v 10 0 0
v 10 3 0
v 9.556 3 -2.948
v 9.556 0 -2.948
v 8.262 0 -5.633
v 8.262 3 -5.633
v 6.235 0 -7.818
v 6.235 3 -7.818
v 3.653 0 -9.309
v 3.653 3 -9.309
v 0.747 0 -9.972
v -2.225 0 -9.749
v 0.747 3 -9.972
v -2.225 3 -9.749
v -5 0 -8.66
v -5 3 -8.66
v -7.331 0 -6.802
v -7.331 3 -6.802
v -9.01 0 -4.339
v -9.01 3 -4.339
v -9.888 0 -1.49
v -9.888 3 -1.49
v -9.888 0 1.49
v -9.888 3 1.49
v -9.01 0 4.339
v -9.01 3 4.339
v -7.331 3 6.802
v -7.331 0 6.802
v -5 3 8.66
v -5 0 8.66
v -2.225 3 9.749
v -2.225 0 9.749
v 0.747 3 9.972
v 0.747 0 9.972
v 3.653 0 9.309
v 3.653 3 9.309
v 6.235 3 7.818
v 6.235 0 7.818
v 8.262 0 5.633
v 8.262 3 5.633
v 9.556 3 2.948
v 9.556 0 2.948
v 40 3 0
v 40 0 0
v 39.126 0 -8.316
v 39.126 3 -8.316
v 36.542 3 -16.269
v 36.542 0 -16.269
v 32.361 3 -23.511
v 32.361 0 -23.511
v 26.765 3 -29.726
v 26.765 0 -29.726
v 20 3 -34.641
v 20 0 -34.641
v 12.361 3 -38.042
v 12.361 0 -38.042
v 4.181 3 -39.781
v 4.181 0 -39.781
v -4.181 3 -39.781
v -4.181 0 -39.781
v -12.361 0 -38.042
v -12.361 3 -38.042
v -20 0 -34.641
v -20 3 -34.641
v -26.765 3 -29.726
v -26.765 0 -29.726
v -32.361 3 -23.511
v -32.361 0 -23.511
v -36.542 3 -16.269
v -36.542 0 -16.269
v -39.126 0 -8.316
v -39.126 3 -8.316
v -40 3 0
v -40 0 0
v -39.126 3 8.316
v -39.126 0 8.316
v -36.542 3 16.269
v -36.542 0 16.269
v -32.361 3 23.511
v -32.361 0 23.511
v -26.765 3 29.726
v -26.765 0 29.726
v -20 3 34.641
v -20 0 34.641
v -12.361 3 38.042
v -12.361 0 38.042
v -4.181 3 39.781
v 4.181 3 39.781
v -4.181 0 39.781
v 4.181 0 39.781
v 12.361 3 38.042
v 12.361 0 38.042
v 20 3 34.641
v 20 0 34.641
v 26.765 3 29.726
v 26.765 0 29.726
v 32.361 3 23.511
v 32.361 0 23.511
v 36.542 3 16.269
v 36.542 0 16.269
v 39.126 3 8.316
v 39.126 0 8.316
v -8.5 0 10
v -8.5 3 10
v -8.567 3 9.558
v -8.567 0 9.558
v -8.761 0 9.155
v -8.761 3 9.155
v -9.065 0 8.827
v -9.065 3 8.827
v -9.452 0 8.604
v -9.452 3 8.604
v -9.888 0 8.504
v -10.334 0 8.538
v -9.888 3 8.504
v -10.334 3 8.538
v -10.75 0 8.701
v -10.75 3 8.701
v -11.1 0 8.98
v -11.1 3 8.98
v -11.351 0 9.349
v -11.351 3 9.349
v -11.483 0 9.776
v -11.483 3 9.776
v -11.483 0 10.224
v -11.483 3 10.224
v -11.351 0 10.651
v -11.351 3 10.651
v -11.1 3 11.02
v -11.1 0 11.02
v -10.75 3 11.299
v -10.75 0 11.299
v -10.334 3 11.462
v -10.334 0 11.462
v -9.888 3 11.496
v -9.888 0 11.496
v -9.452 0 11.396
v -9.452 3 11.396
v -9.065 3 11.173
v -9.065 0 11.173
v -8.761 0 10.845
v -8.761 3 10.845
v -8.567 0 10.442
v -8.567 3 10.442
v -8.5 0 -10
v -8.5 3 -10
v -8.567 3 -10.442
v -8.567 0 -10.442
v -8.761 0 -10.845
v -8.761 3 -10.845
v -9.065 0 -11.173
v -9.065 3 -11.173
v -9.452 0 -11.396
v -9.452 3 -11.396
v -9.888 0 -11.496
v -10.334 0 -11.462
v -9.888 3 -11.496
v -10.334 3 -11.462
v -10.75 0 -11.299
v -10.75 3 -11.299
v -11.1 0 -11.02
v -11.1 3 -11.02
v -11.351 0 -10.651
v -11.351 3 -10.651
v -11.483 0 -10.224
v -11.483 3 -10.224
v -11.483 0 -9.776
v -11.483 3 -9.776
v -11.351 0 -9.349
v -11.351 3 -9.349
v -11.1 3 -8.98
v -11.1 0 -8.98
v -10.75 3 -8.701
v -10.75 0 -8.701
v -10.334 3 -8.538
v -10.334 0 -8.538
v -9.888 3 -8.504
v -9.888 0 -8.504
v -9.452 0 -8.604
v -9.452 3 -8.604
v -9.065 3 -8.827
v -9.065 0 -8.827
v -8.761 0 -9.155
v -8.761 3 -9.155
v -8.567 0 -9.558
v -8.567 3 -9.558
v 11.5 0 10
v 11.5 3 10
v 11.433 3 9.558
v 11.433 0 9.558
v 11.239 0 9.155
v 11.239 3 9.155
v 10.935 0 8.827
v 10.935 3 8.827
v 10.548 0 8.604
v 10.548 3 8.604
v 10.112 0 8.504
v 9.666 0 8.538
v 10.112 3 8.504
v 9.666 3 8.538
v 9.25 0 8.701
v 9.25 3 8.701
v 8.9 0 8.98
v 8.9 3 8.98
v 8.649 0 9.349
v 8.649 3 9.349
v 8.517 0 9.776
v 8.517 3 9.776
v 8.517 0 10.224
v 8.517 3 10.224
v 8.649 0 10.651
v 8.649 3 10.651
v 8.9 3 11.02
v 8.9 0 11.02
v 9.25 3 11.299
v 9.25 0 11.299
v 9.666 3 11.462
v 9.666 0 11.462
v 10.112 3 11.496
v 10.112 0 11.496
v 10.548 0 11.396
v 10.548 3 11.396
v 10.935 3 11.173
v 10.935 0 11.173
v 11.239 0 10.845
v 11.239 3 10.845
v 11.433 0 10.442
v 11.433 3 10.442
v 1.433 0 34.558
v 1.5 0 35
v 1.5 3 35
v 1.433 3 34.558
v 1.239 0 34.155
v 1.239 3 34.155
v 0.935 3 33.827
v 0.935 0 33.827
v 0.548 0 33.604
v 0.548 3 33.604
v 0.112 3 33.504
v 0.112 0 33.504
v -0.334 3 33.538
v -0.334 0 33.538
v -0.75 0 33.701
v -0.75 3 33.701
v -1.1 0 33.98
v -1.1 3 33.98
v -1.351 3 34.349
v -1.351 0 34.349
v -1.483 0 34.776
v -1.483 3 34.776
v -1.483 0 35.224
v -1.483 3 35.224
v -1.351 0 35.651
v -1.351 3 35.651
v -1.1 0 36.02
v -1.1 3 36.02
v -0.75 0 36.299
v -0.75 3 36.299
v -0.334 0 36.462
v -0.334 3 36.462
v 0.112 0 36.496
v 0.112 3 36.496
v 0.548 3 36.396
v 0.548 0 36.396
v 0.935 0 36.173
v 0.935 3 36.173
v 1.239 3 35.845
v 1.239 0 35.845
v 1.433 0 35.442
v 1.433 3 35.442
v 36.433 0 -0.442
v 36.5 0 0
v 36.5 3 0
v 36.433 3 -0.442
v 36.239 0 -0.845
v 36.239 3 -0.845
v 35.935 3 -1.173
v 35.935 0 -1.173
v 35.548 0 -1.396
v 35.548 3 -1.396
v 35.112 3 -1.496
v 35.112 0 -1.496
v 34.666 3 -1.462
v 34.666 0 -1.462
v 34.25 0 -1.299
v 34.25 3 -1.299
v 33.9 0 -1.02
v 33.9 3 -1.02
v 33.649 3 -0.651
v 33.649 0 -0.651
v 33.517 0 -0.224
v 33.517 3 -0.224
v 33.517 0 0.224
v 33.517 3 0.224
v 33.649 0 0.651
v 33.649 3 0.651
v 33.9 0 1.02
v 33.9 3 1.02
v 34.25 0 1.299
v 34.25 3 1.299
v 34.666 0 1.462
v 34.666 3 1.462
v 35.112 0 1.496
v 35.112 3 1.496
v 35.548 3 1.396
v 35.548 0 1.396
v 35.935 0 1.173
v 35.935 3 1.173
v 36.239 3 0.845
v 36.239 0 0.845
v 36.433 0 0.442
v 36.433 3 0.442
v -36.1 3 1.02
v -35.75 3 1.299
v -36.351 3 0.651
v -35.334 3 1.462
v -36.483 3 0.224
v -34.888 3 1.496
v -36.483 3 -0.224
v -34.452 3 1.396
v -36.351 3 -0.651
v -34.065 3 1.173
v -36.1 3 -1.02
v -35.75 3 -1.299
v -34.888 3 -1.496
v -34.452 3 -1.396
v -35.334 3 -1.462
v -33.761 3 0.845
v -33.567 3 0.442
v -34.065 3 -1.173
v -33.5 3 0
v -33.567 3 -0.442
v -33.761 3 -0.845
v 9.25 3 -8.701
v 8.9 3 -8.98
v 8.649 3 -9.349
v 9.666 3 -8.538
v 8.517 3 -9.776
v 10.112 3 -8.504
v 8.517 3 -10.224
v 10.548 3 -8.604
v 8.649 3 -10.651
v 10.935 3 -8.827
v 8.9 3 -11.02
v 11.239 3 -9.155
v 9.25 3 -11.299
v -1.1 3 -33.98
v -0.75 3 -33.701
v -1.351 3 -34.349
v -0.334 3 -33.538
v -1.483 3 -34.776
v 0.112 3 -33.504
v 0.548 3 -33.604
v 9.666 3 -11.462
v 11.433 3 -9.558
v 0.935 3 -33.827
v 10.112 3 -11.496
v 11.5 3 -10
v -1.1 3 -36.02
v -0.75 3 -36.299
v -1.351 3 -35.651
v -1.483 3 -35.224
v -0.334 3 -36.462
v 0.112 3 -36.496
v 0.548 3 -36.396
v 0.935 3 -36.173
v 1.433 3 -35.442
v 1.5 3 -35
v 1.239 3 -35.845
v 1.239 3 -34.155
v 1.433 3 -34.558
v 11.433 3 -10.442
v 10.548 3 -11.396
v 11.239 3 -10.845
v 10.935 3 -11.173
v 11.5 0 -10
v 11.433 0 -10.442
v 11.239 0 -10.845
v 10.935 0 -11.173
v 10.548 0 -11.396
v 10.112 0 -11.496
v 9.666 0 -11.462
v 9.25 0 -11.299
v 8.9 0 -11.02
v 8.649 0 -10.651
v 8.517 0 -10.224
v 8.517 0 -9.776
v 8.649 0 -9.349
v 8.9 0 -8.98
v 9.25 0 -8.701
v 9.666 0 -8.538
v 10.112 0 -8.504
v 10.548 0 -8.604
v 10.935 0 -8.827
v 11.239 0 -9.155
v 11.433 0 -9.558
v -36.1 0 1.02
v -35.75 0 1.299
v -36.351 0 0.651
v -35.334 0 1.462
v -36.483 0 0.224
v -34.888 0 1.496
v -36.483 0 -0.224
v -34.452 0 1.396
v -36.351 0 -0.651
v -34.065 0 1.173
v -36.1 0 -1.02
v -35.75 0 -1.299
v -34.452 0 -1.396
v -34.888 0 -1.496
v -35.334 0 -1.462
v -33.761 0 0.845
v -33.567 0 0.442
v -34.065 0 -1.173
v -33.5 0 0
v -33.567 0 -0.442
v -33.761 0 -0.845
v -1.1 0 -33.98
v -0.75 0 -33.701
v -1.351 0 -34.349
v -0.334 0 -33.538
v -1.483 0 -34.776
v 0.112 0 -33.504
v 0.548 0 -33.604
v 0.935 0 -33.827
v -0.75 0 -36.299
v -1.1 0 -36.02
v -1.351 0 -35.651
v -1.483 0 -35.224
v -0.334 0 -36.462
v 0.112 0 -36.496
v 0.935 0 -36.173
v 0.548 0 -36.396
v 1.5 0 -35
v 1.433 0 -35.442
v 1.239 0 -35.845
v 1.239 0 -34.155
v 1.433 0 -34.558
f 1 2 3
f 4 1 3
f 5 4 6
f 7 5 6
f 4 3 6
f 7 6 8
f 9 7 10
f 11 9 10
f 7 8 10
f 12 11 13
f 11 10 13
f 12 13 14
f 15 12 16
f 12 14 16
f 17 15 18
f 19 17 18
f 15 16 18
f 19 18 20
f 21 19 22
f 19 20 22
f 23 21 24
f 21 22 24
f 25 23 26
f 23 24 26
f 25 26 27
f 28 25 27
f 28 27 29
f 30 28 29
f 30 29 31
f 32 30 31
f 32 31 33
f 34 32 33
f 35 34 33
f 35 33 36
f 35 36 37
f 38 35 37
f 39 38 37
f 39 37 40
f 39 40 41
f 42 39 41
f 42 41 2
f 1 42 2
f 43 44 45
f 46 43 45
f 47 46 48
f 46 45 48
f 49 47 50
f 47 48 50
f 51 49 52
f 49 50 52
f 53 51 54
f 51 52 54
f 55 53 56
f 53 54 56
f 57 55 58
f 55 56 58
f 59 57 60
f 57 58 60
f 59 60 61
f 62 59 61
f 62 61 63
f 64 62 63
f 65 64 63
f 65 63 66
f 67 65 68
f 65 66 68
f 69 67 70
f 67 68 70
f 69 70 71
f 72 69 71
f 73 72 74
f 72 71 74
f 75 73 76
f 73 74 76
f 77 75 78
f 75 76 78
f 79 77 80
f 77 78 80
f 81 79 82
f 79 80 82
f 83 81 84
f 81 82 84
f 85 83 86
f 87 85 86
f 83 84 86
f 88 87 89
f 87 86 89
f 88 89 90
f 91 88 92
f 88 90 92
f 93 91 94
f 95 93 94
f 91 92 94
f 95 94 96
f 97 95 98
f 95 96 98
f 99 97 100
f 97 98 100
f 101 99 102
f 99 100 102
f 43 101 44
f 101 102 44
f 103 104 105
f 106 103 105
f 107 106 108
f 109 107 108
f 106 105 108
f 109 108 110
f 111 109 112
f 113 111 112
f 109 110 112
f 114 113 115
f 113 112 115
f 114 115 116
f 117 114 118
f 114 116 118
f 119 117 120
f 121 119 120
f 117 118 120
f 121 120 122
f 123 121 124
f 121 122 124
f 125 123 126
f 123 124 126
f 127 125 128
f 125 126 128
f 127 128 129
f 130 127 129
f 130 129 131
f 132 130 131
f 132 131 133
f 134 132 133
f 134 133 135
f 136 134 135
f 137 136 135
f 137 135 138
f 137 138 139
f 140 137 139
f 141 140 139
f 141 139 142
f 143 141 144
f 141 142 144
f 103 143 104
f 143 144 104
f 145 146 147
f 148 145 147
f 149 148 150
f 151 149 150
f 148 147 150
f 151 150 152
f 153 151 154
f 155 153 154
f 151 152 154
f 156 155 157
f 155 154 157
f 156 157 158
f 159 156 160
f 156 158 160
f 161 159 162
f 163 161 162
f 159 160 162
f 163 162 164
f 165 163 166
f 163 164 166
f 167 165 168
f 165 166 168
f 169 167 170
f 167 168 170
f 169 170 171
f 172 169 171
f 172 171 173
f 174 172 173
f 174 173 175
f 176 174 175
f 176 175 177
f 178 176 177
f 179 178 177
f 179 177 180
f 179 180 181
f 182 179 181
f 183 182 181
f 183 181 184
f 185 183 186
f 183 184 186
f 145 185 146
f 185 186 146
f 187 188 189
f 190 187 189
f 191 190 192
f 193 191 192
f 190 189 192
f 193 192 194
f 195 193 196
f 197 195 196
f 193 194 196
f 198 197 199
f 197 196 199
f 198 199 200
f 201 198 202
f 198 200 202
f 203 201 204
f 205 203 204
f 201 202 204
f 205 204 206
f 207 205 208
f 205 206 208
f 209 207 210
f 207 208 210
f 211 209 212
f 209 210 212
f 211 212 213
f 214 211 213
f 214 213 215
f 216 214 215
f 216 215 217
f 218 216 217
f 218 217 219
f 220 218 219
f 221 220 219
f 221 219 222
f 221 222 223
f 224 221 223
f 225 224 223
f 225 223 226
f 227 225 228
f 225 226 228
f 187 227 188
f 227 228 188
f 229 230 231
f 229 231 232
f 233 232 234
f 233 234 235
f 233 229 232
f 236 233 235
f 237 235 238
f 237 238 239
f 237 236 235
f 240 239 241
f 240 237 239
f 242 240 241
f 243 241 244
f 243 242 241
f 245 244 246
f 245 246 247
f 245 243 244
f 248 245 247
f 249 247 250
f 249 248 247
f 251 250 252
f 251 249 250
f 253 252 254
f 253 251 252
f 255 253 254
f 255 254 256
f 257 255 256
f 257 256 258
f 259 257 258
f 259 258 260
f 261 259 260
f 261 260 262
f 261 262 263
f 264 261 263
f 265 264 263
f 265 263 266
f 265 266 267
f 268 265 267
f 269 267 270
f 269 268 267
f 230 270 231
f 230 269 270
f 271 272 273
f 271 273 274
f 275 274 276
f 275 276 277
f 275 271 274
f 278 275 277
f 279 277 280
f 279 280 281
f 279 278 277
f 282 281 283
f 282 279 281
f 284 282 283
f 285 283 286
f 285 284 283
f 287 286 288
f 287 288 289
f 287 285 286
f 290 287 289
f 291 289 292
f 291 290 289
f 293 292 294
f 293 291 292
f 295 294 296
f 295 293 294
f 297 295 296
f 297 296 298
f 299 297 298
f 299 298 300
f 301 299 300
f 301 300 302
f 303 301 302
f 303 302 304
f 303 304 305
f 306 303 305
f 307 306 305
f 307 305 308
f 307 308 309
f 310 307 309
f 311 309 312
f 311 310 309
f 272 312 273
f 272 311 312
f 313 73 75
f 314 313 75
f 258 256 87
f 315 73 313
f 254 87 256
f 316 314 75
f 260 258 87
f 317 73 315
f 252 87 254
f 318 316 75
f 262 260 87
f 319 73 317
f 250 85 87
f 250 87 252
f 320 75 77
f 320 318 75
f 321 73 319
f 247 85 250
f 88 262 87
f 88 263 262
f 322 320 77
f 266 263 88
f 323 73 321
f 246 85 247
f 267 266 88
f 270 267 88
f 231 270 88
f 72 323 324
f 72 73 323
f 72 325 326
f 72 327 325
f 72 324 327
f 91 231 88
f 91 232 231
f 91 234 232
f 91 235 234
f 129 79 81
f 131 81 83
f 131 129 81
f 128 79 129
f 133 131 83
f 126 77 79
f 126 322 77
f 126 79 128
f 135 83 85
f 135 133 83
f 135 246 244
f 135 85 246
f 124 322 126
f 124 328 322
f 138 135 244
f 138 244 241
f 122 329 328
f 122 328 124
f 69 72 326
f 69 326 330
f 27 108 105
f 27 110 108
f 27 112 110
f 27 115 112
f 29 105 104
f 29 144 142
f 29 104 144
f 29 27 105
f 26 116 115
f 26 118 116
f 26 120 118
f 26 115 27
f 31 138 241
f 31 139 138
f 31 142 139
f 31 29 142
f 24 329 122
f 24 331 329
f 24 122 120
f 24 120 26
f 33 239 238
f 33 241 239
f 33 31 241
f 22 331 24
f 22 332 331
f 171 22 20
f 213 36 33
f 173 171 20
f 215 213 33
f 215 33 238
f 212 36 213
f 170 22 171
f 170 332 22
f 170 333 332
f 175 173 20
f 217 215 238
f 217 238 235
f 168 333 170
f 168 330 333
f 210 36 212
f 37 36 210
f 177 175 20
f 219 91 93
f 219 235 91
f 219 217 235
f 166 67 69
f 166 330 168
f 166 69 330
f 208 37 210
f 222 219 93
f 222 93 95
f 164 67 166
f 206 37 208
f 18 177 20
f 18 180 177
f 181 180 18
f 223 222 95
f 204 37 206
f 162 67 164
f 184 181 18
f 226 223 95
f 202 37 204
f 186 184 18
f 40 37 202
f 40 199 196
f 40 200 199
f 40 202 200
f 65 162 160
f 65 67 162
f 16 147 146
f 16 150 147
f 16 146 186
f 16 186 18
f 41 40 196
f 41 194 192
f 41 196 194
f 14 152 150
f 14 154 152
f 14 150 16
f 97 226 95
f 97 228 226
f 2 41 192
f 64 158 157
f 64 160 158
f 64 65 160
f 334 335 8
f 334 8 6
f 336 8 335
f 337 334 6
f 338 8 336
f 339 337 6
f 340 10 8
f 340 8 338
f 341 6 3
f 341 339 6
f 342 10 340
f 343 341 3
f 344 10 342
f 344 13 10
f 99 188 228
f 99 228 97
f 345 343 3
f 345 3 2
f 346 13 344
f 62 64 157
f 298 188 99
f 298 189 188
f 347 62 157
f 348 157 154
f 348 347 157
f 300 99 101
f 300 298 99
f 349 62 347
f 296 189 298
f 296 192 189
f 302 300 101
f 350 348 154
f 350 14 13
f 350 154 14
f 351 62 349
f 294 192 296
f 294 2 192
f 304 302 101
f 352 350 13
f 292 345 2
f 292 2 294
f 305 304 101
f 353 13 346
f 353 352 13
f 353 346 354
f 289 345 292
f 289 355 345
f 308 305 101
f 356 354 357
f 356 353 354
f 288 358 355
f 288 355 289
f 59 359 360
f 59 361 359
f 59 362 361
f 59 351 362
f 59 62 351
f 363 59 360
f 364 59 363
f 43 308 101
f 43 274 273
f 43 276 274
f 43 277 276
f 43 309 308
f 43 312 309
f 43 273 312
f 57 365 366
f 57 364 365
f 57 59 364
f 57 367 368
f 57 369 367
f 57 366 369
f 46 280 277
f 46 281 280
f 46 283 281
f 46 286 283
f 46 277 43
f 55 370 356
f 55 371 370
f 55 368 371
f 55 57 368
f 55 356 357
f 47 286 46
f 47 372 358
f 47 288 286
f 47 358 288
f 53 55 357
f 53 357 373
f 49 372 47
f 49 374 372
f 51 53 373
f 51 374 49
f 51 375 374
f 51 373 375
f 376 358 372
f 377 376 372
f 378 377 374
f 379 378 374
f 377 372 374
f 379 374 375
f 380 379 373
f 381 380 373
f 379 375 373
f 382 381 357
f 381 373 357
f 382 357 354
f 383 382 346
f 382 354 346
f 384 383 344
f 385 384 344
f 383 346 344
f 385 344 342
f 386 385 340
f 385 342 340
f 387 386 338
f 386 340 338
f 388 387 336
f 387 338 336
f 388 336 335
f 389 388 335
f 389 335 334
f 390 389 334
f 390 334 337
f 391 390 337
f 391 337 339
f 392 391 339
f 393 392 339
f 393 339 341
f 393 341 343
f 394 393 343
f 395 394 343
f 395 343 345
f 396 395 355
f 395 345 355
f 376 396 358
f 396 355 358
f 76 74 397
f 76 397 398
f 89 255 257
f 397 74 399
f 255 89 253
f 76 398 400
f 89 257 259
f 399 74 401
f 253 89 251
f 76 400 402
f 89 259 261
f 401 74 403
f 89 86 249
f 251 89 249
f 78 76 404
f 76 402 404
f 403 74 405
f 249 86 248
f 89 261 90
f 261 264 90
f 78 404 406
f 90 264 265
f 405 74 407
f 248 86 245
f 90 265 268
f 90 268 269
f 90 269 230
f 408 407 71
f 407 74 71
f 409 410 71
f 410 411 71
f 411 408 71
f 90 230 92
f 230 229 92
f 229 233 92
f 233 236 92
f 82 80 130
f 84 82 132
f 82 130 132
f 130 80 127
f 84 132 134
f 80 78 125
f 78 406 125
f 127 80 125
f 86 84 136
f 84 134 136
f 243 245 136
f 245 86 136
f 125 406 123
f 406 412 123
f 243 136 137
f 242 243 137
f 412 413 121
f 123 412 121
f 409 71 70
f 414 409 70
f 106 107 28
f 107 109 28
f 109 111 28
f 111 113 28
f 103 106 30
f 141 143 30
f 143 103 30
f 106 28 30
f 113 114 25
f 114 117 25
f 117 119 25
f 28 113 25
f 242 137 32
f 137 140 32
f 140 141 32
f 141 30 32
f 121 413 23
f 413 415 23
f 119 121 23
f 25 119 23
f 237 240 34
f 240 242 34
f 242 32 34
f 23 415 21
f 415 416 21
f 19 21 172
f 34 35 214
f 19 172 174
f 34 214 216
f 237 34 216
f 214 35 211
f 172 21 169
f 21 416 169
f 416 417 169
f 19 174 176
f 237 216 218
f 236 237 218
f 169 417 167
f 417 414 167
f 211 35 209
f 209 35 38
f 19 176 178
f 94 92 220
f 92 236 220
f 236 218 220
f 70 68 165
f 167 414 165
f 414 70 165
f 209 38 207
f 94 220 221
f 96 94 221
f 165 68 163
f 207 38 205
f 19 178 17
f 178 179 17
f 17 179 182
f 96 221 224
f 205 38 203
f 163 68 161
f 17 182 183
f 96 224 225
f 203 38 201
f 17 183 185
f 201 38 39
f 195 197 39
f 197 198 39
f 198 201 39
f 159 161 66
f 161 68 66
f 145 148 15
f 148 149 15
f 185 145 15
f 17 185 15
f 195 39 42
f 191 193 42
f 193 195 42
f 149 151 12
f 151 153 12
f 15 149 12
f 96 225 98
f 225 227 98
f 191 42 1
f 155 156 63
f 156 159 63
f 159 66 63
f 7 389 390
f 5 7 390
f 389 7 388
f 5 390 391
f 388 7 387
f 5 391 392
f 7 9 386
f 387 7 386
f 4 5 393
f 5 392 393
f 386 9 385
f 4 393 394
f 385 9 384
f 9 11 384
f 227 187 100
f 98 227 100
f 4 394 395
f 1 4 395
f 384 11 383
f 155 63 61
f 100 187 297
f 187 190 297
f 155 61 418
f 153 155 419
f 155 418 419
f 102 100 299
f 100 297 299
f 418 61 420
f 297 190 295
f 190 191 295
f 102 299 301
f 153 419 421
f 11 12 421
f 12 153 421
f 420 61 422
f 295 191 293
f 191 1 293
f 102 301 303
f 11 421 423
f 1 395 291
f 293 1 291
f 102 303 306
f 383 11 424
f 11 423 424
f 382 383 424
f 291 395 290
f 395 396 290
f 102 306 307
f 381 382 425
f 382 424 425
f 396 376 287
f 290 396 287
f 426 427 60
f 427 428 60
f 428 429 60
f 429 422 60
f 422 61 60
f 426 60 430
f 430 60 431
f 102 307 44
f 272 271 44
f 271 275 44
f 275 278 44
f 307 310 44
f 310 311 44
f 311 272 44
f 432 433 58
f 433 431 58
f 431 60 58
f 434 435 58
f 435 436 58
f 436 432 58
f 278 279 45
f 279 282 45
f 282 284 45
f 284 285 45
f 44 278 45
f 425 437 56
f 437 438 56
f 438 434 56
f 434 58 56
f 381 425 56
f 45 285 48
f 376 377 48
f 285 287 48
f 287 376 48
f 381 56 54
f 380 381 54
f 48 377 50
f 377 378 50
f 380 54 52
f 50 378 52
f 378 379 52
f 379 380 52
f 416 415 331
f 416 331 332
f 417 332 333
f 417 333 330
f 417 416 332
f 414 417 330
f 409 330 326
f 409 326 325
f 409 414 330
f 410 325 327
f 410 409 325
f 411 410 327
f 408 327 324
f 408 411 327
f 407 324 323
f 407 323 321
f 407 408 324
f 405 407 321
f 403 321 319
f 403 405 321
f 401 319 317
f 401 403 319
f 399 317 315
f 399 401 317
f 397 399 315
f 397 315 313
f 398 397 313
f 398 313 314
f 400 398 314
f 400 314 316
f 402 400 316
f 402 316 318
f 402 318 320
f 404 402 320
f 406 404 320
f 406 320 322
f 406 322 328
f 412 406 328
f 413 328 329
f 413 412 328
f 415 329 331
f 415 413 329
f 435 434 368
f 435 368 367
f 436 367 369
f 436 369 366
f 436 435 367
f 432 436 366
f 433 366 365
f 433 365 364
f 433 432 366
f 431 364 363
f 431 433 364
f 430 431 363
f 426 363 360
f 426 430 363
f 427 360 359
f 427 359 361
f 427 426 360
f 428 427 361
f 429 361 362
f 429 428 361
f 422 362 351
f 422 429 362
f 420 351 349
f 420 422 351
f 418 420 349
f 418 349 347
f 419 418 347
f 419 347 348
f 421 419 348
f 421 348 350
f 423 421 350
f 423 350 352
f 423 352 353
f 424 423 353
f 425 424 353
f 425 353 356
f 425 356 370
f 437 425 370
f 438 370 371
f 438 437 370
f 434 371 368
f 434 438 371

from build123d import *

# Parameters (mm, degrees)
SKETCH1_R           = 40
SKETCH1_R_2         = 1.5
BOSS_EXTRUDE1_DEPTH = 3
SKETCH2_R           = 1.5
CUT_EXTRUDE1_DEPTH  = 3
SKETCH3_R           = 10
CUT_EXTRUDE2_DEPTH  = 10


with BuildPart() as part:
    # Sketch1 → Boss-Extrude1 (new body)
    with BuildSketch(Plane(origin=(0, 0, 0), x_dir=(1, 0, 0), z_dir=(0, 1, 0))):
        Circle(SKETCH1_R)
        with Locations((0, 35)):
            Circle(SKETCH1_R_2, mode=Mode.SUBTRACT)
        with Locations((35, 0)):
            Circle(SKETCH1_R_2, mode=Mode.SUBTRACT)
        with Locations((0, -35)):
            Circle(SKETCH1_R_2, mode=Mode.SUBTRACT)
        with Locations((-35, 0)):
            Circle(SKETCH1_R_2, mode=Mode.SUBTRACT)
    extrude(amount=BOSS_EXTRUDE1_DEPTH)

    # Sketch2 → Cut-Extrude1 (cut)
    with BuildSketch(Plane(origin=(0, 3, 0), x_dir=(1, 0, 0), z_dir=(0, 1, 0))):
        with Locations((10, 10)):
            Circle(SKETCH2_R)
        with Locations((-10, 10)):
            Circle(SKETCH2_R)
        with Locations((-10, -10)):
            Circle(SKETCH2_R)
        with Locations((10, -10)):
            Circle(SKETCH2_R)
    extrude(amount=-CUT_EXTRUDE1_DEPTH, mode=Mode.SUBTRACT)

    # Sketch3 → Cut-Extrude2 (cut)
    with BuildSketch(Plane(origin=(0, 3, 0), x_dir=(1, 0, 0), z_dir=(0, 1, 0))):
        Circle(SKETCH3_R)
    extrude(amount=-CUT_EXTRUDE2_DEPTH, mode=Mode.SUBTRACT)


solid = part.part
